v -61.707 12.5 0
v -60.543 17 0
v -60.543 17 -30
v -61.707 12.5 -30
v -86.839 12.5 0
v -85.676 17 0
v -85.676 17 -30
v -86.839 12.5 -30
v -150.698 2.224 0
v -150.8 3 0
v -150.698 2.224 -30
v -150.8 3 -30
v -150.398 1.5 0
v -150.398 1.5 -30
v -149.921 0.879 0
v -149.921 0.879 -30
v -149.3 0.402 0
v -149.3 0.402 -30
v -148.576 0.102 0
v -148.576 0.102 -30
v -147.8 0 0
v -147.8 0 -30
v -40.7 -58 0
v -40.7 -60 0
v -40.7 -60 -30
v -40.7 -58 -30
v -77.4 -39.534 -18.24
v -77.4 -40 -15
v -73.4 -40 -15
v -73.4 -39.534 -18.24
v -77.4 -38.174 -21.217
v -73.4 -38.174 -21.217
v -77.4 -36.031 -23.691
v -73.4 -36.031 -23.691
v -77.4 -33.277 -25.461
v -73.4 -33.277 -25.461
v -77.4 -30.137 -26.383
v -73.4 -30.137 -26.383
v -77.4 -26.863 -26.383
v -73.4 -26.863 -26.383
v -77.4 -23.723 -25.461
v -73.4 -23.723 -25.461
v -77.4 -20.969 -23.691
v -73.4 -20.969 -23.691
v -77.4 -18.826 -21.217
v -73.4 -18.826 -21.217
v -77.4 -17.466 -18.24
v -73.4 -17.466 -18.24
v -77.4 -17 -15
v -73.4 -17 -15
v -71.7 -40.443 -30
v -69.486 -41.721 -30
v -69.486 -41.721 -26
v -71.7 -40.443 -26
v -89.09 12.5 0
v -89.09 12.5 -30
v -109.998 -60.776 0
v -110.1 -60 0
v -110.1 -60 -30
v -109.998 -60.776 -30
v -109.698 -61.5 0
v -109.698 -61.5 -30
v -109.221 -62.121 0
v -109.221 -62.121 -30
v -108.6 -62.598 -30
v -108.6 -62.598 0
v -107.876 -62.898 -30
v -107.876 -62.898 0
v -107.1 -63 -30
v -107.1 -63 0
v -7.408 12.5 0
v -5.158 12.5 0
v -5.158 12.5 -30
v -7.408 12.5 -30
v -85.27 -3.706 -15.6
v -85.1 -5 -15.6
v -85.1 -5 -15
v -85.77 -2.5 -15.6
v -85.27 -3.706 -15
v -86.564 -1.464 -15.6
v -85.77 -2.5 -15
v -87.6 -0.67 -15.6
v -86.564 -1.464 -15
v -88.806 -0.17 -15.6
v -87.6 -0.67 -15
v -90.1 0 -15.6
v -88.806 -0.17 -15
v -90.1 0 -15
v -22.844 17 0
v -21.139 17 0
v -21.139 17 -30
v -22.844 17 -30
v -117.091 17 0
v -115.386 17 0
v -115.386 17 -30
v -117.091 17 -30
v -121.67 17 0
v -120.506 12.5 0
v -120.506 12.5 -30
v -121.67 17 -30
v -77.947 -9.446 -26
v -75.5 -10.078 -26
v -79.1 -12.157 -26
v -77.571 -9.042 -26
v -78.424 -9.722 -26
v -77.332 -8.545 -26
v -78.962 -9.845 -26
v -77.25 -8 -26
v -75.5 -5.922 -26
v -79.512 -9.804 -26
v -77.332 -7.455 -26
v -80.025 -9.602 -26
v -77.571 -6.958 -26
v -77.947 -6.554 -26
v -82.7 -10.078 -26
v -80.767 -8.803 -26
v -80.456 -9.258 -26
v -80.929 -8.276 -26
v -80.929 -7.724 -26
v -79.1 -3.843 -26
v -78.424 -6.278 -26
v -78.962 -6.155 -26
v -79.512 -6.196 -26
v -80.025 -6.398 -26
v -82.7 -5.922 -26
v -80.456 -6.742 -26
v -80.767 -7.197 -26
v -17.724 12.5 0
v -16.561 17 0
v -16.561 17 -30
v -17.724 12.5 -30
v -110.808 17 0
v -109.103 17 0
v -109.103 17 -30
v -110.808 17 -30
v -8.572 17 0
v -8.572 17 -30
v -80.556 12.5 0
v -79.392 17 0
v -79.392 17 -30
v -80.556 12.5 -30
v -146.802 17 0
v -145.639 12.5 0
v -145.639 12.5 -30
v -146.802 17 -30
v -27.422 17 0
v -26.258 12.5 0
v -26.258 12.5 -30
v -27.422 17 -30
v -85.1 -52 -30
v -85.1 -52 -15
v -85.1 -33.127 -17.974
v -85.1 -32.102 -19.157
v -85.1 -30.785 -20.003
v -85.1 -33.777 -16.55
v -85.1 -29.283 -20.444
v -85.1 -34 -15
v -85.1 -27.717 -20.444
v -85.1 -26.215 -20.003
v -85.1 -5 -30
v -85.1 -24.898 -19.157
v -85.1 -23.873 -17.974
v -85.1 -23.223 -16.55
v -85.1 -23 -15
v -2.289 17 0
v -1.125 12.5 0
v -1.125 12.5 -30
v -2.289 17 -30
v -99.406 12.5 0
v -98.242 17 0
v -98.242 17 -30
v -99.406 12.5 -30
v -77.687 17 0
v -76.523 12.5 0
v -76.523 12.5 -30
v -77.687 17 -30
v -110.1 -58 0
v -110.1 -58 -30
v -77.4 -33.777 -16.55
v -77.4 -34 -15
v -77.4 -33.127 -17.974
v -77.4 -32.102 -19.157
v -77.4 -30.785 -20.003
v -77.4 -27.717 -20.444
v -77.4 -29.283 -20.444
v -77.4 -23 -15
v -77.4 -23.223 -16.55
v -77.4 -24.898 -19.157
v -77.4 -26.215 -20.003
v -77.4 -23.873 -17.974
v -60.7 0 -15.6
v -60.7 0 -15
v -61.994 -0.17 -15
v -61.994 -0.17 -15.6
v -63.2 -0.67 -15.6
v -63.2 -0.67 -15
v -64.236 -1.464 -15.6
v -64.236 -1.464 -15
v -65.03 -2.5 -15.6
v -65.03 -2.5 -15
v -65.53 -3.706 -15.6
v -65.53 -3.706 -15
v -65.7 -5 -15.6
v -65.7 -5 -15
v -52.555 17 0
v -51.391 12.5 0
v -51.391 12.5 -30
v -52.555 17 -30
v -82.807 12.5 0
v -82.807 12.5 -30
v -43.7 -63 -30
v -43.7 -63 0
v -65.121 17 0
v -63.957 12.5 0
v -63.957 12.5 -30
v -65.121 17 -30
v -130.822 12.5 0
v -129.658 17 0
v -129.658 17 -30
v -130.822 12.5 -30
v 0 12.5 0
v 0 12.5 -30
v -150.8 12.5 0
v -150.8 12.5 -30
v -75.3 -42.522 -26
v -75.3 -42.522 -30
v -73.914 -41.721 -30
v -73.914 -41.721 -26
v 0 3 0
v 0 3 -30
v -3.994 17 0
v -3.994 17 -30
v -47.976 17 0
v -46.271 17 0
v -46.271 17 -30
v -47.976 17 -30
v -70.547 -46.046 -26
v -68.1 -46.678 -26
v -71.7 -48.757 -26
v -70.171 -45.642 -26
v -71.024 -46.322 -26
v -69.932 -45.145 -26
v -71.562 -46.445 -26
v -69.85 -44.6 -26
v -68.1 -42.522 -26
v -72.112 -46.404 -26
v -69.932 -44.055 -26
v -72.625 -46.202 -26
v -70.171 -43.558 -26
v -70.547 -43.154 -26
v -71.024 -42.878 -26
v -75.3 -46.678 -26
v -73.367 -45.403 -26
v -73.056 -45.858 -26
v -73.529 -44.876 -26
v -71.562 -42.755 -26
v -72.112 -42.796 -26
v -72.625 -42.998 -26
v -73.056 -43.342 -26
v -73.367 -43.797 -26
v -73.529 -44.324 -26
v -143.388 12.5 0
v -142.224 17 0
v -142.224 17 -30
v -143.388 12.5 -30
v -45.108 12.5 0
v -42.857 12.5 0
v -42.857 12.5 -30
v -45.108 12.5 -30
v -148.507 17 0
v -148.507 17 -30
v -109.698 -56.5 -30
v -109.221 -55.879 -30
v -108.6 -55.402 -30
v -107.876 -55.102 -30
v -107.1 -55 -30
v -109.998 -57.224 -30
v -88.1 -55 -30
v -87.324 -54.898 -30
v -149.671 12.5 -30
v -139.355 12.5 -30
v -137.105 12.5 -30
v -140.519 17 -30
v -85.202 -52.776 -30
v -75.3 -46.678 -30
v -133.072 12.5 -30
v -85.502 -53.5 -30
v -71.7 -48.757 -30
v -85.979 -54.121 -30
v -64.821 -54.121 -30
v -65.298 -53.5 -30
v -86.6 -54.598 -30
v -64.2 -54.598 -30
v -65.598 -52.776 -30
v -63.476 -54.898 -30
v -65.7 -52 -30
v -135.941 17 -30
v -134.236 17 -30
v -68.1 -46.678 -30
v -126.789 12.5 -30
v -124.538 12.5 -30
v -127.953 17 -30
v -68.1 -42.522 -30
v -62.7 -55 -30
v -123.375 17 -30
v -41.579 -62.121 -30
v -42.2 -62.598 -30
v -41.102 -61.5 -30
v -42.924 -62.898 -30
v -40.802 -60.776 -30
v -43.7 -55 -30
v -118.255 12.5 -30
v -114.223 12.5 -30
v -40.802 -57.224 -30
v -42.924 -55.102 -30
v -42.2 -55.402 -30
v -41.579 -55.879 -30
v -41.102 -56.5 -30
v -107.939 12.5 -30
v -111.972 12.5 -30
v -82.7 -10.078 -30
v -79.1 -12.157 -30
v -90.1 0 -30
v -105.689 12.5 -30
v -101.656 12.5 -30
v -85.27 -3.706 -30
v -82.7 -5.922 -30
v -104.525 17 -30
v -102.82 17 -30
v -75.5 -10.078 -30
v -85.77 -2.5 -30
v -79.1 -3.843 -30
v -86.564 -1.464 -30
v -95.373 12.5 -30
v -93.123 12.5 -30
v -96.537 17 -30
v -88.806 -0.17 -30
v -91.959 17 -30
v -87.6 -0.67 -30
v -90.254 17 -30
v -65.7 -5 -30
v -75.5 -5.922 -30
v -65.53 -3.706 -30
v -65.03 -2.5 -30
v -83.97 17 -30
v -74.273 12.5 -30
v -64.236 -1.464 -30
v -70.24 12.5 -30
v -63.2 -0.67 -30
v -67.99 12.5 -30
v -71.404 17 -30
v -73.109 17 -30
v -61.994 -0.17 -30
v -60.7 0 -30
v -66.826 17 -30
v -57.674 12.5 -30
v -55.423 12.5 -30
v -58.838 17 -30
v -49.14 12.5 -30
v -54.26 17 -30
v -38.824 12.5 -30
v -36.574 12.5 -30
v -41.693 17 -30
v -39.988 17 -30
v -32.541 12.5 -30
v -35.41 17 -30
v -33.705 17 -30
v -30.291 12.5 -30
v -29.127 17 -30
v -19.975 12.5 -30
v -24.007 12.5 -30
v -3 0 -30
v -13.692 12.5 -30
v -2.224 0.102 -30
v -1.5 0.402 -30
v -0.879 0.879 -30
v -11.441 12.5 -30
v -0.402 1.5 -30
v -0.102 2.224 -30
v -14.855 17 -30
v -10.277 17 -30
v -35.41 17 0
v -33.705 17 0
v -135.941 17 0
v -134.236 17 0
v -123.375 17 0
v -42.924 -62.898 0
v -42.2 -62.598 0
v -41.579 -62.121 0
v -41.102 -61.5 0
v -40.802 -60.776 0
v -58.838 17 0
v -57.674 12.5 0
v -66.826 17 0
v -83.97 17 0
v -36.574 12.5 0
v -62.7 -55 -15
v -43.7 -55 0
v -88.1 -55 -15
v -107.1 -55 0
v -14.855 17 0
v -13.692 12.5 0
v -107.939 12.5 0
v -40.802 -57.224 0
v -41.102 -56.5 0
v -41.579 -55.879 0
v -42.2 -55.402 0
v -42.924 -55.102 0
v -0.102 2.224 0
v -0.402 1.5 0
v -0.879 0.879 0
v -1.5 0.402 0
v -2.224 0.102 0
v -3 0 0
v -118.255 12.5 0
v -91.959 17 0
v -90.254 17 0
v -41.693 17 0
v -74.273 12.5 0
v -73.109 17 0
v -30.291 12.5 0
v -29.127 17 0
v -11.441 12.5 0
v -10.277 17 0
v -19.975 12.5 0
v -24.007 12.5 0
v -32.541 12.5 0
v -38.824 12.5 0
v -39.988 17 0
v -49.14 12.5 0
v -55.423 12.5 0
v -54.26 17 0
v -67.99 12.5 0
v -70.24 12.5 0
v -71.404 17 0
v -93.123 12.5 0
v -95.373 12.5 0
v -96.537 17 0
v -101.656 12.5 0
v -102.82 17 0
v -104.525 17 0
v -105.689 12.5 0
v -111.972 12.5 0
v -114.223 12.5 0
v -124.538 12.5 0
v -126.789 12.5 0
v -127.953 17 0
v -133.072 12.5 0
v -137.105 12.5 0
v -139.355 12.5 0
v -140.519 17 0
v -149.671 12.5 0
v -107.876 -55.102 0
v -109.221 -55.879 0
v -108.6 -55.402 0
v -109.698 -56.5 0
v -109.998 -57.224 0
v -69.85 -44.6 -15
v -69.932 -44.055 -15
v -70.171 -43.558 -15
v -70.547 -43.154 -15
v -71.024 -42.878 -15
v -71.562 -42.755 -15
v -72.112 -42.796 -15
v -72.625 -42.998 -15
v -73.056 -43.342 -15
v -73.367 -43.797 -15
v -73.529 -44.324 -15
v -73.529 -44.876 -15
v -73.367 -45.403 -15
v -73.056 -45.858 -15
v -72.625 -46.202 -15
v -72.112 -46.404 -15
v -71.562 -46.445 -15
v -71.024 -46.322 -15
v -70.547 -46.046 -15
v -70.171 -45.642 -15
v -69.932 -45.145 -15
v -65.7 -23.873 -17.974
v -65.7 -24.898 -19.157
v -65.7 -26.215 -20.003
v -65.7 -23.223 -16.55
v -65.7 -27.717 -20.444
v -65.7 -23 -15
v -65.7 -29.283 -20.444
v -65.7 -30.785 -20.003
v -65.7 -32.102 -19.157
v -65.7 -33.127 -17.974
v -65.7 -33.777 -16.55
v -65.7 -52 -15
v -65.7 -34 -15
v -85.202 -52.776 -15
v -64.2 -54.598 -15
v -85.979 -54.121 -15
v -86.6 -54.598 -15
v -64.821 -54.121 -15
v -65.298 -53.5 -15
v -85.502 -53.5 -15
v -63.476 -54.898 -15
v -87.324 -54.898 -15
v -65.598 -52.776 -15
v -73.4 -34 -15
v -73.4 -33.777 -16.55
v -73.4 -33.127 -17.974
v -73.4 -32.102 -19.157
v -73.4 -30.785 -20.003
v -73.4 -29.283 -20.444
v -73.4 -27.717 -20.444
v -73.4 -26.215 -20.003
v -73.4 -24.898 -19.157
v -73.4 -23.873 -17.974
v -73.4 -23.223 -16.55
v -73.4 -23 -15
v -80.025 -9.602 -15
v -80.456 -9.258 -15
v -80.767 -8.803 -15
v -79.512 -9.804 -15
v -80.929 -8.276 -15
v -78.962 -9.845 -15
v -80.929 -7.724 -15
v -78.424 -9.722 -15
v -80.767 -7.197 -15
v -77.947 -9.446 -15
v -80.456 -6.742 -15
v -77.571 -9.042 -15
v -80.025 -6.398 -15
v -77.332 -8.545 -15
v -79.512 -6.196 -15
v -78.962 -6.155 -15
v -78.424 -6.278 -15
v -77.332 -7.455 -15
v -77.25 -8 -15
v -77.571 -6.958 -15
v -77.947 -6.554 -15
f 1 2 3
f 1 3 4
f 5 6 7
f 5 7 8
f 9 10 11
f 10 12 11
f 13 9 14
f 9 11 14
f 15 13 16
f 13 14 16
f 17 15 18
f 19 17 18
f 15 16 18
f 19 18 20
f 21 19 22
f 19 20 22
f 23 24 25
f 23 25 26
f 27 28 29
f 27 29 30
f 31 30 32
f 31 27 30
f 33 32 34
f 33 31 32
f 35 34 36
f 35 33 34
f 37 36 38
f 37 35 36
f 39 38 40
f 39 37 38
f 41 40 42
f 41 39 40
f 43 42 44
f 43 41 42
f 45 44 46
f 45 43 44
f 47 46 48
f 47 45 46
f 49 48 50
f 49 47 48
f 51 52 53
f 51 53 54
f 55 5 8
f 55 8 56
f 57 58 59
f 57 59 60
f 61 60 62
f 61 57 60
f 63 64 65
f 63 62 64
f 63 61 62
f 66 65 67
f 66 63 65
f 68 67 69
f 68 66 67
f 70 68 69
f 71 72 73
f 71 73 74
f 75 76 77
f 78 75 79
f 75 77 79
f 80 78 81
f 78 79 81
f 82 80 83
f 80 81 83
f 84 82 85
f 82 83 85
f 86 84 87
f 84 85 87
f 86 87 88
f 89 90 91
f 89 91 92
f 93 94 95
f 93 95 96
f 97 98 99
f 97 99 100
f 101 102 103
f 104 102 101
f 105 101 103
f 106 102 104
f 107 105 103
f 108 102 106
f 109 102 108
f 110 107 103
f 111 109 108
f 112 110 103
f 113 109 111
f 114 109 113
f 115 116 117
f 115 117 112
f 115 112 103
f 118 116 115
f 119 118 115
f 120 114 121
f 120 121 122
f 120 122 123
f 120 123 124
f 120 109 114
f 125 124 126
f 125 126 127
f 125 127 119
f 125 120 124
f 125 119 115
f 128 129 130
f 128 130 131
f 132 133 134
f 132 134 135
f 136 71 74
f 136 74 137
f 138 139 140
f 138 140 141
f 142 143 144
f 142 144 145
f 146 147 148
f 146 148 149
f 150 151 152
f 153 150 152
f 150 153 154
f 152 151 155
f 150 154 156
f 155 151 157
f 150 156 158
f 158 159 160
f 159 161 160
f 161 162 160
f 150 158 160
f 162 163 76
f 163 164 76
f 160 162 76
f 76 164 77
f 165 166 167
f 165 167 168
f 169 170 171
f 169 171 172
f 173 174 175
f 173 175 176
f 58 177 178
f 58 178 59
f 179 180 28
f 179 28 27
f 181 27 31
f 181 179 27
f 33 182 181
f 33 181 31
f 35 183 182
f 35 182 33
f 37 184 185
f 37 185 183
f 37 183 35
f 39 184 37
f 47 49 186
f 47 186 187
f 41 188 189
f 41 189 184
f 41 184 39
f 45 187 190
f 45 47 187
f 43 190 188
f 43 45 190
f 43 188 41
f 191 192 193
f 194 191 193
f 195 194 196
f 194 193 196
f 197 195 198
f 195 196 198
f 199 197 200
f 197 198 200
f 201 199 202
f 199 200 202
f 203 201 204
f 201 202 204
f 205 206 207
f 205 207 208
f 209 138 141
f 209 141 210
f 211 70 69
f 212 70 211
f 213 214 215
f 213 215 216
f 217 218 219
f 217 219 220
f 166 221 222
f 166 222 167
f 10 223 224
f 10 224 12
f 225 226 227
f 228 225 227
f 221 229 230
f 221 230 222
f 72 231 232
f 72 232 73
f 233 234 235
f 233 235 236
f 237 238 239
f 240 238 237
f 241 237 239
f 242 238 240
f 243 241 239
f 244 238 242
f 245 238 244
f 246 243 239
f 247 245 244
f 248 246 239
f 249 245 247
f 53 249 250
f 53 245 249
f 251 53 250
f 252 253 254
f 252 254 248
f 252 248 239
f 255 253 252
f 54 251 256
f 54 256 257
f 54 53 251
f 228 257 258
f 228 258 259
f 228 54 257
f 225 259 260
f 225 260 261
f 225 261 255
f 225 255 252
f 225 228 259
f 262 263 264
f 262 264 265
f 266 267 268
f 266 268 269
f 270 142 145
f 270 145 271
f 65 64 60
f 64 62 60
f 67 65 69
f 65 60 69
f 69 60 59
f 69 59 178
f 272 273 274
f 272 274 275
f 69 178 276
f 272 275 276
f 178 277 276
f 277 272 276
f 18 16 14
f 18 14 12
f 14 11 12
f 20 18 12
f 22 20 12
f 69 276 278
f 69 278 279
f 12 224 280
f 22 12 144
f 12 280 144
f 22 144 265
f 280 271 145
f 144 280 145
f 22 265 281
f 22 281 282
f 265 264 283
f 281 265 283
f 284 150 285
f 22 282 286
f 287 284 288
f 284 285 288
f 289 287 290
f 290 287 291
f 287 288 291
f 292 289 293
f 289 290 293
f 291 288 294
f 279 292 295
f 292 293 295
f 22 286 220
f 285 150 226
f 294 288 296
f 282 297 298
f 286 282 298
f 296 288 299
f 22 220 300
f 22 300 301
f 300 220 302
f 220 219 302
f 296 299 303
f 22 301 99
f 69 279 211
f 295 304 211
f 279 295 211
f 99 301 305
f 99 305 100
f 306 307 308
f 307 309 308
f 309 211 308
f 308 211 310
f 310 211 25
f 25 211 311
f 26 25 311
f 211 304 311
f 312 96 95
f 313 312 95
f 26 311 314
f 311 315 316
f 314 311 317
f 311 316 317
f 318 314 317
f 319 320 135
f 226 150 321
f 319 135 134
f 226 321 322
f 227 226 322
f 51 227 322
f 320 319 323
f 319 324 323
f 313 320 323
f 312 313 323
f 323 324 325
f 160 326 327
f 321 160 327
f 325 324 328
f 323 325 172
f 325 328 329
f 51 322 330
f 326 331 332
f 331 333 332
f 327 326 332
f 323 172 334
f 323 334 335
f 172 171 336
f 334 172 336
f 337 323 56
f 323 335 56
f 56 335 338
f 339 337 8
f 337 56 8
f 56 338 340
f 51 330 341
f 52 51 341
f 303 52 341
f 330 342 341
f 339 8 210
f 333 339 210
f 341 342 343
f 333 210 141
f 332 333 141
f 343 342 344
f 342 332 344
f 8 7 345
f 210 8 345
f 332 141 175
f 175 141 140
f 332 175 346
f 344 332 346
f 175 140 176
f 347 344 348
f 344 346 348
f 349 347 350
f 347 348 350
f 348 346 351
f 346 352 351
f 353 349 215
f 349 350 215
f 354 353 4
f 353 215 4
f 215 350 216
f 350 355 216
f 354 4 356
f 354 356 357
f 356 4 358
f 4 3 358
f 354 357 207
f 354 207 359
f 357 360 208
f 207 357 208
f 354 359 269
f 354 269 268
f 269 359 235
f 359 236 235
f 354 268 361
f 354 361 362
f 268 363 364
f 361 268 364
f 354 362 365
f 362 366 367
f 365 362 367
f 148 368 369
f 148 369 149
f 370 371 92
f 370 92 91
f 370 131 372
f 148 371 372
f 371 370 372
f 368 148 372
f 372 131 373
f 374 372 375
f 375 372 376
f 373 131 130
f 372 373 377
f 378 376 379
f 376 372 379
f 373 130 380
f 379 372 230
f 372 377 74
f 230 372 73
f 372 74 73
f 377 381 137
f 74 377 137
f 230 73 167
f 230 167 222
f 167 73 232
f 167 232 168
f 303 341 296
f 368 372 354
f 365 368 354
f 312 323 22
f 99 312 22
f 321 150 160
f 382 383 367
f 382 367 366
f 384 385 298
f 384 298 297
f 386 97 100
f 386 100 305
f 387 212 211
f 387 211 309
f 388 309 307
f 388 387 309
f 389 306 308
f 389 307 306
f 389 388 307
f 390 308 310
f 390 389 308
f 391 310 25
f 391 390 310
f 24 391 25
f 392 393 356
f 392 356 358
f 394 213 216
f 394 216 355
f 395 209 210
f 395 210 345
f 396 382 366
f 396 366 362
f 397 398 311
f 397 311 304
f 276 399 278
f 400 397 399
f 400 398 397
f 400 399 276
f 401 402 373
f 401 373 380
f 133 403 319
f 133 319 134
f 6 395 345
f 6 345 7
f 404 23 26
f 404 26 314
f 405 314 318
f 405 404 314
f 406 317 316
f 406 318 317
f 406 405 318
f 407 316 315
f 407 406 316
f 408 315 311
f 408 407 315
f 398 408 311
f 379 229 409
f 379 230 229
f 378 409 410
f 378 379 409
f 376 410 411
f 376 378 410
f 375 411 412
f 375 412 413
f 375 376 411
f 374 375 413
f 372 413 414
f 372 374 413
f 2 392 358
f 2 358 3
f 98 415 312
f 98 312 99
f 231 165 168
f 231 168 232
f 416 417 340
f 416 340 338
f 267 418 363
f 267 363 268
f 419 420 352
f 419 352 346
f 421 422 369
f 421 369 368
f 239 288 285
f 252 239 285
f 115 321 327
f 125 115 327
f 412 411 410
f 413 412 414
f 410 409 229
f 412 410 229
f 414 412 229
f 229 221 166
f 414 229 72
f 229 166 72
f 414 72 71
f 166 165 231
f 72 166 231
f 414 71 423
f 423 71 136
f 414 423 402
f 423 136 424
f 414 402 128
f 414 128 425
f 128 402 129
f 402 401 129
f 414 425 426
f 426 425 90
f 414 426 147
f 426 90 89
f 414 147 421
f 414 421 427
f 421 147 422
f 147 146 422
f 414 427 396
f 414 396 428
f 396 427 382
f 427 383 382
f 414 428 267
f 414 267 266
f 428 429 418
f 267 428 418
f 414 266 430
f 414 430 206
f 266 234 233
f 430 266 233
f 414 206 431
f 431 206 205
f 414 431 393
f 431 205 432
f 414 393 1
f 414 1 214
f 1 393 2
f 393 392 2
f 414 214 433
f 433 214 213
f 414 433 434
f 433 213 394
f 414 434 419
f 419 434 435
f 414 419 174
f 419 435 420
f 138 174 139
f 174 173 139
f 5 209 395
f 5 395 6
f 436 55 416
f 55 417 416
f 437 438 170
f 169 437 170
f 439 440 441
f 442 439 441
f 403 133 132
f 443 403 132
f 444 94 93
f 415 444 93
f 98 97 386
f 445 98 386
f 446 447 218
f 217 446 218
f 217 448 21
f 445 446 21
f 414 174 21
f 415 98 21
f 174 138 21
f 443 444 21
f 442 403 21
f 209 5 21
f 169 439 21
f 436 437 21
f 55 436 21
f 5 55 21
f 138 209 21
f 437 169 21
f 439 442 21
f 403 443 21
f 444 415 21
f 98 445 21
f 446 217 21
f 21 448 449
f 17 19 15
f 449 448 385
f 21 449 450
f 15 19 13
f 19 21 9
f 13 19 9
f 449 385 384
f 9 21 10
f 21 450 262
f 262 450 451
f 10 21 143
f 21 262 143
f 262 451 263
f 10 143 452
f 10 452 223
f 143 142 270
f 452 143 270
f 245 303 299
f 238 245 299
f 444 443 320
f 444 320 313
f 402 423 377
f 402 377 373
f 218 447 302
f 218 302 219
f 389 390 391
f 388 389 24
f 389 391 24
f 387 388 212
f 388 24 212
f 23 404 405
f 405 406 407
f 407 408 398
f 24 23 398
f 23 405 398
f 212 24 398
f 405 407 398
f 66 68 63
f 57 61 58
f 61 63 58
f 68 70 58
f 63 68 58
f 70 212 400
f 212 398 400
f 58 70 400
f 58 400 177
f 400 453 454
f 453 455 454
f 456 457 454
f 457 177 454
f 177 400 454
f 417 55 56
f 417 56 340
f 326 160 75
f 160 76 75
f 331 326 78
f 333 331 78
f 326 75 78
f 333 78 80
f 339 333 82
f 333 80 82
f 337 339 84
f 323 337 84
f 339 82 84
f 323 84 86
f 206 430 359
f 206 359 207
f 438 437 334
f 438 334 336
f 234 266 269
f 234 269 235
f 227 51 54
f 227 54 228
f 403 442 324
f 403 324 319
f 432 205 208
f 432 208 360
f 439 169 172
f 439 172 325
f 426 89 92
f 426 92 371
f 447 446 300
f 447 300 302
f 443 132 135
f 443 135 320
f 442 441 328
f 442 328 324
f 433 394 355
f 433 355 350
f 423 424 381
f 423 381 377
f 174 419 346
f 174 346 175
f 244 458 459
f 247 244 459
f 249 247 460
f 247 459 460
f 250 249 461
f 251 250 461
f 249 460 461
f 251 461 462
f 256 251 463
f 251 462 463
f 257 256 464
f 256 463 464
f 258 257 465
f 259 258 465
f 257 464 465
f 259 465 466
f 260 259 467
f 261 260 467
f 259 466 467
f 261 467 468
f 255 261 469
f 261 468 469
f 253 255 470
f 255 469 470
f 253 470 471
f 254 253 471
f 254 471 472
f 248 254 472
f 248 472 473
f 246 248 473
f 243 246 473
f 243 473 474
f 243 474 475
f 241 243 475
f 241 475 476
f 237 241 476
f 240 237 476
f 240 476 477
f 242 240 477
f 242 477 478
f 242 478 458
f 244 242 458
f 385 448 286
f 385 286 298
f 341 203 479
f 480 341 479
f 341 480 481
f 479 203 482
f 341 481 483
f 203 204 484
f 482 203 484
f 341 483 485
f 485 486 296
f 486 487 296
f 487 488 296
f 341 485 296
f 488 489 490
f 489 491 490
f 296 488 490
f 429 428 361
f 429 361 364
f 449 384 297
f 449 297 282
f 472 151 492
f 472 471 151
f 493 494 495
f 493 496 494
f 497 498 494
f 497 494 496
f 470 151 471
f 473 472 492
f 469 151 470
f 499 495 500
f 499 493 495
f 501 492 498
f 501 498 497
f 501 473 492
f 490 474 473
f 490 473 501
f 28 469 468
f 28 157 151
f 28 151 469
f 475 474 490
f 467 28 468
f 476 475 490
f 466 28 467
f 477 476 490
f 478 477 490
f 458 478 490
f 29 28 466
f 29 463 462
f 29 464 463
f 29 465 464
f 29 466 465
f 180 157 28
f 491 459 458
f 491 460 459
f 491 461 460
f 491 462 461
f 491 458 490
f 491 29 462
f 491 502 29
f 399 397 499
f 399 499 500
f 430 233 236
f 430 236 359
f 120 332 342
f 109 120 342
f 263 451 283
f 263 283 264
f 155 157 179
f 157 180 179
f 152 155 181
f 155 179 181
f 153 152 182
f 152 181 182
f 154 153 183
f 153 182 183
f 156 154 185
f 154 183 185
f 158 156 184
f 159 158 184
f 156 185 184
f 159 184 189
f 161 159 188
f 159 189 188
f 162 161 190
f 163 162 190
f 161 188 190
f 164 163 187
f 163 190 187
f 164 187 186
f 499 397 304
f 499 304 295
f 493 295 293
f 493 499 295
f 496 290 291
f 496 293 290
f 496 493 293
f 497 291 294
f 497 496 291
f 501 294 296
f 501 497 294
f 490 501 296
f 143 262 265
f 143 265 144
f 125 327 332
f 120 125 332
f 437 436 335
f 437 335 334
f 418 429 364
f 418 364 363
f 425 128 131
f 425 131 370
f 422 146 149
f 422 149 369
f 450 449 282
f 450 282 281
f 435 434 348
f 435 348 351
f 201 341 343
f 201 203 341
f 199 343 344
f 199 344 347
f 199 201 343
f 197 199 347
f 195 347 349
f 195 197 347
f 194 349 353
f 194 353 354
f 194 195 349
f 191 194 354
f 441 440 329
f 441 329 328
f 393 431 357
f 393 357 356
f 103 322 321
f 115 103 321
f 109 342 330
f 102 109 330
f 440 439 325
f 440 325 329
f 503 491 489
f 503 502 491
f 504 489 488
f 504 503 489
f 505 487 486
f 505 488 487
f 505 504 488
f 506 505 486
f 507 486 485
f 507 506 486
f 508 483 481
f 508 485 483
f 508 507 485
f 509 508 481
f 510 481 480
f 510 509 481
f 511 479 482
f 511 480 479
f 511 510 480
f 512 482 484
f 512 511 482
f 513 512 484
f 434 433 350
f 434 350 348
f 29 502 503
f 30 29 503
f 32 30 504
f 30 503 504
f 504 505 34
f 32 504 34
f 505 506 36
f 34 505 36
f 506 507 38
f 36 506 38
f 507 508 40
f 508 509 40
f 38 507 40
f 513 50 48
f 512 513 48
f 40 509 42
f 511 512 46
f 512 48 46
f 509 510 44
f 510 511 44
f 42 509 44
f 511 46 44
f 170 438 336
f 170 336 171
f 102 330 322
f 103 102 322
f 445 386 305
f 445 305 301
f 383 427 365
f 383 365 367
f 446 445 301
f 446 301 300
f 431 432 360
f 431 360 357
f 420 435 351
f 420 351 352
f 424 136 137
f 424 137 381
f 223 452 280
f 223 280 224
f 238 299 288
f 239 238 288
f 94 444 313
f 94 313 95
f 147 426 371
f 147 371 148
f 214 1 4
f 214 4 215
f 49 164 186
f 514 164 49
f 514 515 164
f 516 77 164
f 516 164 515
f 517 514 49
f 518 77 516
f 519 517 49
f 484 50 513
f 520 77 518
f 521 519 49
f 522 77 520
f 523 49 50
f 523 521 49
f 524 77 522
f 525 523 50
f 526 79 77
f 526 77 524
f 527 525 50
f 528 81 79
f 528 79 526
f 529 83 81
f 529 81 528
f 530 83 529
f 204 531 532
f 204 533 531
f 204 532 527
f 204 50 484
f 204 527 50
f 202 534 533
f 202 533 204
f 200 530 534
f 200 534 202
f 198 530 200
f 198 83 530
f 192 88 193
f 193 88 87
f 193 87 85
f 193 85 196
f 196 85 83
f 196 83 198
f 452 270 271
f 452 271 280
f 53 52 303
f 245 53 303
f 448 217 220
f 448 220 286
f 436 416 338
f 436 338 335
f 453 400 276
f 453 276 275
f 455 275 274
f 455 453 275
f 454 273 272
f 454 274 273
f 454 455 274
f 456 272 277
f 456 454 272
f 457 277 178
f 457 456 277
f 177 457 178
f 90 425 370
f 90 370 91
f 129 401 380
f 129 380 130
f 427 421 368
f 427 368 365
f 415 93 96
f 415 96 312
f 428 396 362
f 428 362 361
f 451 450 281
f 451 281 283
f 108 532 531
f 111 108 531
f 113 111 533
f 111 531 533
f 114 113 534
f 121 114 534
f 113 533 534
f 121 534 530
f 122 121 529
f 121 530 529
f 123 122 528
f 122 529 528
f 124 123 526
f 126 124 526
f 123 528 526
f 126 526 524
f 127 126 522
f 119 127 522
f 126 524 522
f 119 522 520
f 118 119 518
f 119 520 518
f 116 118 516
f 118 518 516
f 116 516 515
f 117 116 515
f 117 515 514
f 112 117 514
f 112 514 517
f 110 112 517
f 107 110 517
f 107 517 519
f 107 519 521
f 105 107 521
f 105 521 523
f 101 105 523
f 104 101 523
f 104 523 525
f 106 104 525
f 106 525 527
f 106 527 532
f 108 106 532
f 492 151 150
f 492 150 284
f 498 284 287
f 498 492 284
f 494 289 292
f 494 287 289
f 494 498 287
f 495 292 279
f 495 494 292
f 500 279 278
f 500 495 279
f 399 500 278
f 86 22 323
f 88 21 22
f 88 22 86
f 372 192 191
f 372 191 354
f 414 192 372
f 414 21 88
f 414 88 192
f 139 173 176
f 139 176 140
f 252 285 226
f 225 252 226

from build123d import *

# Parameters (mm, degrees)
RESSALTO_EXTRUS_O1_DEPTH          = 30
RESSALTO_EXTRUS_O2_DEPTH          = 30
ESBO_O3_W                         = 19.4
ESBO_O3_H                         = 3.2
CORTE_EXTRUS_O1_DEPTH             = 23.85
ESBO_O4_W                         = 5.4
ESBO_O4_H                         = 23.8
CORTE_EXTRUS_O2_DEPTH             = 26.5
ESBO_O5_W                         = 19.4
ESBO_O5_H                         = 53
CORTE_EXTRUS_O3_DEPTH             = 15.6
FILETE1_R                         = 5
ESBO_O6_W                         = 69.4
ESBO_O6_H                         = 15.6
CORTE_EXTRUS_O4_DEPTH             = 10
FILETE2_R                         = 3
RESSALTO_EXTRUS_O3_START          = 15.6
RESSALTO_EXTRUS_O3_DEPTH          = 15.6
ESBO_O8_R                         = 1.85
CORTE_EXTRUS_O5_DEPTH             = 165.173688513
CORTE_EXTRUS_O6_DEPTH             = 4
ESBO_O10_W                        = 14.4
ESBO_O10_H                        = 28.961678943
RESSALTO_EXTRUS_O4_DEPTH          = 19.4
RESSALTO_EXTRUS_O5_START          = 15.6
ESBO_O11_R                        = 1.85
RESSALTO_EXTRUS_O5_DEPTH          = 15.6
ESBO_O12_W                        = 35.911027454
ESBO_O12_H                        = 55
CORTE_EXTRUS_O7_DEPTH             = 15
CORTE_EXTRUS_O8_DEPTH             = 2
CORTE_EXTRUS_O8_DEPTH_BACK        = 2
ESBO_O13_R                        = 11.5
CORTE_EXTRUS_O9_REACH             = 104.733
ESBO_O14_R                        = 5.5
CORTE_EXTRUS_O9_DIRECTION_2_REACH = 104.733
CORTE_EXTRUS_O10_DEPTH            = 4


with BuildPart() as part:
    # Esboço1 → Ressalto-extrusão1 (new body)
    with BuildSketch(Plane.XY):
        Polygon((-148.507415706, 17), (-149.671194836, 12.5), (-150.8, 12.5), (-150.8, 0), (0, 0), (0, 12.5), (-1.125252364, 12.5), (-2.289031494, 17), (-3.994153806, 17), (-5.157932936, 12.5), (-7.408437664, 12.5), (-8.572216794, 17), (-10.277339106, 17), (-11.441118236, 12.5), (-13.691622964, 12.5), (-14.855402094, 17), (-16.560524406, 17), (-17.724303536, 12.5), (-19.974808264, 12.5), (-21.138587394, 17), (-22.843709706, 17), (-24.007488836, 12.5), (-26.257993564, 12.5), (-27.421772694, 17), (-29.126895006, 17), (-30.290674136, 12.5), (-32.541178864, 12.5), (-33.704957994, 17), (-35.410080306, 17), (-36.573859436, 12.5), (-38.824364164, 12.5), (-39.988143294, 17), (-41.693265606, 17), (-42.857044736, 12.5), (-45.107549464, 12.5), (-46.271328594, 17), (-47.976450906, 17), (-49.140230036, 12.5), (-51.390734764, 12.5), (-52.554513894, 17), (-54.259636206, 17), (-55.423415336, 12.5), (-57.673920064, 12.5), (-58.837699194, 17), (-60.542821506, 17), (-61.706600636, 12.5), (-63.957105364, 12.5), (-65.120884494, 17), (-66.826006806, 17), (-67.989785936, 12.5), (-70.240290664, 12.5), (-71.404069794, 17), (-73.109192106, 17), (-74.272971236, 12.5), (-76.523475964, 12.5), (-77.687255094, 17), (-79.392377406, 17), (-80.556156536, 12.5), (-82.806661264, 12.5), (-83.970440394, 17), (-85.675562706, 17), (-86.839341836, 12.5), (-89.089846564, 12.5), (-90.253625694, 17), (-91.958748006, 17), (-93.122527136, 12.5), (-95.373031864, 12.5), (-96.536810994, 17), (-98.241933306, 17), (-99.405712436, 12.5), (-101.656217164, 12.5), (-102.819996294, 17), (-104.525118606, 17), (-105.688897736, 12.5), (-107.939402464, 12.5), (-109.103181594, 17), (-110.808303906, 17), (-111.972083036, 12.5), (-114.222587764, 12.5), (-115.386366894, 17), (-117.091489206, 17), (-118.255268336, 12.5), (-120.505773064, 12.5), (-121.669552194, 17), (-123.374674506, 17), (-124.538453636, 12.5), (-126.788958364, 12.5), (-127.952737494, 17), (-129.657859806, 17), (-130.821638936, 12.5), (-133.072143664, 12.5), (-134.235922794, 17), (-135.941045106, 17), (-137.104824236, 12.5), (-139.355328964, 12.5), (-140.519108094, 17), (-142.224230406, 17), (-143.388009536, 12.5), (-145.638514264, 12.5), (-146.802293394, 17), align=None)
    extrude(amount=-RESSALTO_EXTRUS_O1_DEPTH)

    # Esboço2 → Ressalto-extrusão2 (add)
    with BuildSketch(Plane(origin=(0, 0, -30), x_dir=(-1, 0, 0), z_dir=(0, 0, -1))):
        Polygon((85.1, 0), (65.7, 0), (65.7, -55), (40.7, -55), (40.7, -63), (110.1, -63), (110.1, -55), (85.1, -55), align=None)
    extrude(amount=-RESSALTO_EXTRUS_O2_DEPTH)

    # Esboço3 → Corte-extrusão1 (cut)
    with BuildSketch(Plane.XY):
        with Locations((-75.4, -29)):
            Rectangle(ESBO_O3_W, ESBO_O3_H)
    extrude(amount=-CORTE_EXTRUS_O1_DEPTH, mode=Mode.SUBTRACT)

    # Esboço4 → Corte-extrusão2 (cut)
    with BuildSketch(Plane.XY):
        with Locations((-75.4, -29)):
            Rectangle(ESBO_O4_W, ESBO_O4_H)
    extrude(amount=-CORTE_EXTRUS_O2_DEPTH, mode=Mode.SUBTRACT)

    # Esboço5 → Corte-extrusão3 (cut)
    with BuildSketch(Plane.XY):
        with Locations((-75.4, -26.5)):
            Rectangle(ESBO_O5_W, ESBO_O5_H)
    extrude(amount=-CORTE_EXTRUS_O3_DEPTH, mode=Mode.SUBTRACT)

    # Filete1
    filete1_edges = [part.edges().sort_by_distance(p)[0] for p in [
        (-85.1, 0, -22.8),
        (-65.7, 0, -22.8),
    ]]
    fillet(filete1_edges, radius=FILETE1_R)

    # Esboço6 → Corte-extrusão4 (cut)
    with BuildSketch(Plane.XZ.offset(63)):
        with Locations((-75.4, -7.8)):
            Rectangle(ESBO_O6_W, ESBO_O6_H)
    extrude(amount=-CORTE_EXTRUS_O4_DEPTH, mode=Mode.SUBTRACT)

    # Filete2
    filete2_edges = [part.edges().sort_by_distance(p)[0] for p in [
        (0, 0, -15),
        (-150.8, 0, -15),
        (-85.1, -55, -22.8),
        (-110.1, -55, -22.8),
        (-110.1, -63, -22.8),
        (-40.7, -63, -22.8),
        (-40.7, -55, -22.8),
        (-65.7, -55, -22.8),
    ]]
    fillet(filete2_edges, radius=FILETE2_R)

    # Esboço7 → Ressalto-extrusão3 (add)
    with BuildSketch(Plane.XY.offset(-15.6).offset(RESSALTO_EXTRUS_O3_START)):
        with BuildLine():
            Line((-110.1, -58), (-110.1, -60))
            ThreePointArc((-110.1, -60), (-109.221320344, -62.121320344), (-107.1, -63))
            Line((-107.1, -63), (-43.7, -63))
            ThreePointArc((-43.7, -63), (-41.578679656, -62.121320344), (-40.7, -60))
            Line((-40.7, -60), (-40.7, -58))
            ThreePointArc((-40.7, -58), (-41.578679656, -55.878679656), (-43.7, -55))
            Line((-43.7, -55), (-62.7, -55))
            ThreePointArc((-62.7, -55), (-64.821320344, -54.121320344), (-65.7, -52))
            Line((-65.7, -52), (-65.7, -51.6))
            Line((-65.7, -51.6), (-85.1, -51.6))
            Line((-85.1, -51.6), (-85.1, -52))
            ThreePointArc((-85.1, -52), (-85.978679656, -54.121320344), (-88.1, -55))
            Line((-88.1, -55), (-107.1, -55))
            ThreePointArc((-107.1, -55), (-109.221320344, -55.878679656), (-110.1, -58))
        make_face()
    extrude(amount=-RESSALTO_EXTRUS_O3_DEPTH)

    # Esboço8 → Corte-extrusão5 (cut, through all)
    with BuildSketch(Plane.XY.offset(-15.6)):
        with Locations((-79.1, -8)):
            Circle(ESBO_O8_R)
        with Locations((-71.7, -44.6)):
            Circle(ESBO_O8_R)
    extrude(amount=-CORTE_EXTRUS_O5_DEPTH, mode=Mode.SUBTRACT)

    # Esboço9 → Corte-extrusão6 (cut)
    with BuildSketch(Plane(origin=(0, 0, -30), x_dir=(-1, 0, 0), z_dir=(0, 0, -1))):
        Polygon((79.1, -3.843078062), (75.5, -5.921539031), (75.5, -10.078460969), (79.1, -12.156921938), (82.7, -10.078460969), (82.7, -5.921539031), align=None)
        Polygon((71.7, -40.443078062), (68.1, -42.521539031), (68.1, -46.678460969), (71.7, -48.756921938), (75.3, -46.678460969), (75.3, -42.521539031), align=None)
    extrude(amount=-CORTE_EXTRUS_O6_DEPTH, mode=Mode.SUBTRACT)

    # Esboço10 → Ressalto-extrusão4 (add)
    with BuildSketch(Plane(origin=(-65.7, 0, 0), x_dir=(0, 0, -1), z_dir=(1, 0, 0))):
        with Locations((22.8, -27.2404917)):
            Rectangle(ESBO_O10_W, ESBO_O10_H)
    extrude(amount=-RESSALTO_EXTRUS_O4_DEPTH)

    # Esboço11 → Ressalto-extrusão5 (add)
    with BuildSketch(Plane.XY.offset(-15.6).offset(RESSALTO_EXTRUS_O5_START)):
        with BuildLine():
            Line((-90.1, 0), (-60.7, 0))
            ThreePointArc((-60.7, 0), (-64.235533906, -1.464466094), (-65.7, -5))
            Line((-65.7, -5), (-65.7, -51.6))
            Line((-65.7, -51.6), (-85.1, -51.6))
            Line((-85.1, -51.6), (-85.1, -5))
            ThreePointArc((-85.1, -5), (-86.564466094, -1.464466094), (-90.1, 0))
        make_face()
        with Locations((-79.1, -8)):
            Circle(ESBO_O11_R, mode=Mode.SUBTRACT)
        with Locations((-71.7, -44.6)):
            Circle(ESBO_O11_R, mode=Mode.SUBTRACT)
    extrude(amount=-RESSALTO_EXTRUS_O5_DEPTH)

    # Esboço12 → Corte-extrusão7 (cut)
    with BuildSketch(Plane.XY):
        with Locations((-72.144486273, -27.5)):
            Rectangle(ESBO_O12_W, ESBO_O12_H)
    extrude(amount=-CORTE_EXTRUS_O7_DEPTH, mode=Mode.SUBTRACT)

    # Esboço13 → Corte-extrusão8 (cut, two sides: drawn at the far end of the back side and taken through both)
    with BuildSketch(Plane(origin=(-75.4, 0, 0), x_dir=(0, 0, -1), z_dir=(1, 0, 0)).offset(-CORTE_EXTRUS_O8_DEPTH_BACK)):
        with Locations((15, -28.5)):
            Circle(ESBO_O13_R)
    extrude(amount=CORTE_EXTRUS_O8_DEPTH + CORTE_EXTRUS_O8_DEPTH_BACK, mode=Mode.SUBTRACT)

    # Esboço14 → Corte-extrusão9 (cut, up to next)
    with BuildSketch(Plane(origin=(-75.4, 0, 0), x_dir=(0, 0, -1), z_dir=(1, 0, 0)), mode=Mode.PRIVATE) as corte_extrus_o9_sk1:
        with Locations((15, -28.5)):
            Circle(ESBO_O14_R)
    corte_extrus_o9_tool1 = extrude(corte_extrus_o9_sk1.sketch, amount=-CORTE_EXTRUS_O9_REACH, mode=Mode.PRIVATE) & part.part
    add(corte_extrus_o9_tool1.solids().sort_by_distance((-75.4, -28.5, -15))[0], mode=Mode.SUBTRACT)

    # Esboço14 → Corte-extrusão9 direction 2 (cut, up to next)
    with BuildSketch(Plane(origin=(-75.4, 0, 0), x_dir=(0, 0, -1), z_dir=(1, 0, 0)), mode=Mode.PRIVATE) as corte_extrus_o9_direction_2_sk1:
        with Locations((15, -28.5)):
            Circle(ESBO_O14_R)
    corte_extrus_o9_direction_2_tool1 = extrude(corte_extrus_o9_direction_2_sk1.sketch, amount=CORTE_EXTRUS_O9_DIRECTION_2_REACH, mode=Mode.PRIVATE) & part.part
    add(corte_extrus_o9_direction_2_tool1.solids().sort_by_distance((-75.4, -28.5, -15))[0], mode=Mode.SUBTRACT)

    # Esboço15 → Corte-extrusão10 (cut)
    with BuildSketch(Plane(origin=(0, 0, -30), x_dir=(-1, 0, 0), z_dir=(0, 0, -1))):
        Polygon((69.486000671, -41.721331171), (71.7, -40.443078062), (73.913999329, -41.721331171), align=None)
    extrude(amount=-CORTE_EXTRUS_O10_DEPTH, mode=Mode.SUBTRACT)


solid = part.part
